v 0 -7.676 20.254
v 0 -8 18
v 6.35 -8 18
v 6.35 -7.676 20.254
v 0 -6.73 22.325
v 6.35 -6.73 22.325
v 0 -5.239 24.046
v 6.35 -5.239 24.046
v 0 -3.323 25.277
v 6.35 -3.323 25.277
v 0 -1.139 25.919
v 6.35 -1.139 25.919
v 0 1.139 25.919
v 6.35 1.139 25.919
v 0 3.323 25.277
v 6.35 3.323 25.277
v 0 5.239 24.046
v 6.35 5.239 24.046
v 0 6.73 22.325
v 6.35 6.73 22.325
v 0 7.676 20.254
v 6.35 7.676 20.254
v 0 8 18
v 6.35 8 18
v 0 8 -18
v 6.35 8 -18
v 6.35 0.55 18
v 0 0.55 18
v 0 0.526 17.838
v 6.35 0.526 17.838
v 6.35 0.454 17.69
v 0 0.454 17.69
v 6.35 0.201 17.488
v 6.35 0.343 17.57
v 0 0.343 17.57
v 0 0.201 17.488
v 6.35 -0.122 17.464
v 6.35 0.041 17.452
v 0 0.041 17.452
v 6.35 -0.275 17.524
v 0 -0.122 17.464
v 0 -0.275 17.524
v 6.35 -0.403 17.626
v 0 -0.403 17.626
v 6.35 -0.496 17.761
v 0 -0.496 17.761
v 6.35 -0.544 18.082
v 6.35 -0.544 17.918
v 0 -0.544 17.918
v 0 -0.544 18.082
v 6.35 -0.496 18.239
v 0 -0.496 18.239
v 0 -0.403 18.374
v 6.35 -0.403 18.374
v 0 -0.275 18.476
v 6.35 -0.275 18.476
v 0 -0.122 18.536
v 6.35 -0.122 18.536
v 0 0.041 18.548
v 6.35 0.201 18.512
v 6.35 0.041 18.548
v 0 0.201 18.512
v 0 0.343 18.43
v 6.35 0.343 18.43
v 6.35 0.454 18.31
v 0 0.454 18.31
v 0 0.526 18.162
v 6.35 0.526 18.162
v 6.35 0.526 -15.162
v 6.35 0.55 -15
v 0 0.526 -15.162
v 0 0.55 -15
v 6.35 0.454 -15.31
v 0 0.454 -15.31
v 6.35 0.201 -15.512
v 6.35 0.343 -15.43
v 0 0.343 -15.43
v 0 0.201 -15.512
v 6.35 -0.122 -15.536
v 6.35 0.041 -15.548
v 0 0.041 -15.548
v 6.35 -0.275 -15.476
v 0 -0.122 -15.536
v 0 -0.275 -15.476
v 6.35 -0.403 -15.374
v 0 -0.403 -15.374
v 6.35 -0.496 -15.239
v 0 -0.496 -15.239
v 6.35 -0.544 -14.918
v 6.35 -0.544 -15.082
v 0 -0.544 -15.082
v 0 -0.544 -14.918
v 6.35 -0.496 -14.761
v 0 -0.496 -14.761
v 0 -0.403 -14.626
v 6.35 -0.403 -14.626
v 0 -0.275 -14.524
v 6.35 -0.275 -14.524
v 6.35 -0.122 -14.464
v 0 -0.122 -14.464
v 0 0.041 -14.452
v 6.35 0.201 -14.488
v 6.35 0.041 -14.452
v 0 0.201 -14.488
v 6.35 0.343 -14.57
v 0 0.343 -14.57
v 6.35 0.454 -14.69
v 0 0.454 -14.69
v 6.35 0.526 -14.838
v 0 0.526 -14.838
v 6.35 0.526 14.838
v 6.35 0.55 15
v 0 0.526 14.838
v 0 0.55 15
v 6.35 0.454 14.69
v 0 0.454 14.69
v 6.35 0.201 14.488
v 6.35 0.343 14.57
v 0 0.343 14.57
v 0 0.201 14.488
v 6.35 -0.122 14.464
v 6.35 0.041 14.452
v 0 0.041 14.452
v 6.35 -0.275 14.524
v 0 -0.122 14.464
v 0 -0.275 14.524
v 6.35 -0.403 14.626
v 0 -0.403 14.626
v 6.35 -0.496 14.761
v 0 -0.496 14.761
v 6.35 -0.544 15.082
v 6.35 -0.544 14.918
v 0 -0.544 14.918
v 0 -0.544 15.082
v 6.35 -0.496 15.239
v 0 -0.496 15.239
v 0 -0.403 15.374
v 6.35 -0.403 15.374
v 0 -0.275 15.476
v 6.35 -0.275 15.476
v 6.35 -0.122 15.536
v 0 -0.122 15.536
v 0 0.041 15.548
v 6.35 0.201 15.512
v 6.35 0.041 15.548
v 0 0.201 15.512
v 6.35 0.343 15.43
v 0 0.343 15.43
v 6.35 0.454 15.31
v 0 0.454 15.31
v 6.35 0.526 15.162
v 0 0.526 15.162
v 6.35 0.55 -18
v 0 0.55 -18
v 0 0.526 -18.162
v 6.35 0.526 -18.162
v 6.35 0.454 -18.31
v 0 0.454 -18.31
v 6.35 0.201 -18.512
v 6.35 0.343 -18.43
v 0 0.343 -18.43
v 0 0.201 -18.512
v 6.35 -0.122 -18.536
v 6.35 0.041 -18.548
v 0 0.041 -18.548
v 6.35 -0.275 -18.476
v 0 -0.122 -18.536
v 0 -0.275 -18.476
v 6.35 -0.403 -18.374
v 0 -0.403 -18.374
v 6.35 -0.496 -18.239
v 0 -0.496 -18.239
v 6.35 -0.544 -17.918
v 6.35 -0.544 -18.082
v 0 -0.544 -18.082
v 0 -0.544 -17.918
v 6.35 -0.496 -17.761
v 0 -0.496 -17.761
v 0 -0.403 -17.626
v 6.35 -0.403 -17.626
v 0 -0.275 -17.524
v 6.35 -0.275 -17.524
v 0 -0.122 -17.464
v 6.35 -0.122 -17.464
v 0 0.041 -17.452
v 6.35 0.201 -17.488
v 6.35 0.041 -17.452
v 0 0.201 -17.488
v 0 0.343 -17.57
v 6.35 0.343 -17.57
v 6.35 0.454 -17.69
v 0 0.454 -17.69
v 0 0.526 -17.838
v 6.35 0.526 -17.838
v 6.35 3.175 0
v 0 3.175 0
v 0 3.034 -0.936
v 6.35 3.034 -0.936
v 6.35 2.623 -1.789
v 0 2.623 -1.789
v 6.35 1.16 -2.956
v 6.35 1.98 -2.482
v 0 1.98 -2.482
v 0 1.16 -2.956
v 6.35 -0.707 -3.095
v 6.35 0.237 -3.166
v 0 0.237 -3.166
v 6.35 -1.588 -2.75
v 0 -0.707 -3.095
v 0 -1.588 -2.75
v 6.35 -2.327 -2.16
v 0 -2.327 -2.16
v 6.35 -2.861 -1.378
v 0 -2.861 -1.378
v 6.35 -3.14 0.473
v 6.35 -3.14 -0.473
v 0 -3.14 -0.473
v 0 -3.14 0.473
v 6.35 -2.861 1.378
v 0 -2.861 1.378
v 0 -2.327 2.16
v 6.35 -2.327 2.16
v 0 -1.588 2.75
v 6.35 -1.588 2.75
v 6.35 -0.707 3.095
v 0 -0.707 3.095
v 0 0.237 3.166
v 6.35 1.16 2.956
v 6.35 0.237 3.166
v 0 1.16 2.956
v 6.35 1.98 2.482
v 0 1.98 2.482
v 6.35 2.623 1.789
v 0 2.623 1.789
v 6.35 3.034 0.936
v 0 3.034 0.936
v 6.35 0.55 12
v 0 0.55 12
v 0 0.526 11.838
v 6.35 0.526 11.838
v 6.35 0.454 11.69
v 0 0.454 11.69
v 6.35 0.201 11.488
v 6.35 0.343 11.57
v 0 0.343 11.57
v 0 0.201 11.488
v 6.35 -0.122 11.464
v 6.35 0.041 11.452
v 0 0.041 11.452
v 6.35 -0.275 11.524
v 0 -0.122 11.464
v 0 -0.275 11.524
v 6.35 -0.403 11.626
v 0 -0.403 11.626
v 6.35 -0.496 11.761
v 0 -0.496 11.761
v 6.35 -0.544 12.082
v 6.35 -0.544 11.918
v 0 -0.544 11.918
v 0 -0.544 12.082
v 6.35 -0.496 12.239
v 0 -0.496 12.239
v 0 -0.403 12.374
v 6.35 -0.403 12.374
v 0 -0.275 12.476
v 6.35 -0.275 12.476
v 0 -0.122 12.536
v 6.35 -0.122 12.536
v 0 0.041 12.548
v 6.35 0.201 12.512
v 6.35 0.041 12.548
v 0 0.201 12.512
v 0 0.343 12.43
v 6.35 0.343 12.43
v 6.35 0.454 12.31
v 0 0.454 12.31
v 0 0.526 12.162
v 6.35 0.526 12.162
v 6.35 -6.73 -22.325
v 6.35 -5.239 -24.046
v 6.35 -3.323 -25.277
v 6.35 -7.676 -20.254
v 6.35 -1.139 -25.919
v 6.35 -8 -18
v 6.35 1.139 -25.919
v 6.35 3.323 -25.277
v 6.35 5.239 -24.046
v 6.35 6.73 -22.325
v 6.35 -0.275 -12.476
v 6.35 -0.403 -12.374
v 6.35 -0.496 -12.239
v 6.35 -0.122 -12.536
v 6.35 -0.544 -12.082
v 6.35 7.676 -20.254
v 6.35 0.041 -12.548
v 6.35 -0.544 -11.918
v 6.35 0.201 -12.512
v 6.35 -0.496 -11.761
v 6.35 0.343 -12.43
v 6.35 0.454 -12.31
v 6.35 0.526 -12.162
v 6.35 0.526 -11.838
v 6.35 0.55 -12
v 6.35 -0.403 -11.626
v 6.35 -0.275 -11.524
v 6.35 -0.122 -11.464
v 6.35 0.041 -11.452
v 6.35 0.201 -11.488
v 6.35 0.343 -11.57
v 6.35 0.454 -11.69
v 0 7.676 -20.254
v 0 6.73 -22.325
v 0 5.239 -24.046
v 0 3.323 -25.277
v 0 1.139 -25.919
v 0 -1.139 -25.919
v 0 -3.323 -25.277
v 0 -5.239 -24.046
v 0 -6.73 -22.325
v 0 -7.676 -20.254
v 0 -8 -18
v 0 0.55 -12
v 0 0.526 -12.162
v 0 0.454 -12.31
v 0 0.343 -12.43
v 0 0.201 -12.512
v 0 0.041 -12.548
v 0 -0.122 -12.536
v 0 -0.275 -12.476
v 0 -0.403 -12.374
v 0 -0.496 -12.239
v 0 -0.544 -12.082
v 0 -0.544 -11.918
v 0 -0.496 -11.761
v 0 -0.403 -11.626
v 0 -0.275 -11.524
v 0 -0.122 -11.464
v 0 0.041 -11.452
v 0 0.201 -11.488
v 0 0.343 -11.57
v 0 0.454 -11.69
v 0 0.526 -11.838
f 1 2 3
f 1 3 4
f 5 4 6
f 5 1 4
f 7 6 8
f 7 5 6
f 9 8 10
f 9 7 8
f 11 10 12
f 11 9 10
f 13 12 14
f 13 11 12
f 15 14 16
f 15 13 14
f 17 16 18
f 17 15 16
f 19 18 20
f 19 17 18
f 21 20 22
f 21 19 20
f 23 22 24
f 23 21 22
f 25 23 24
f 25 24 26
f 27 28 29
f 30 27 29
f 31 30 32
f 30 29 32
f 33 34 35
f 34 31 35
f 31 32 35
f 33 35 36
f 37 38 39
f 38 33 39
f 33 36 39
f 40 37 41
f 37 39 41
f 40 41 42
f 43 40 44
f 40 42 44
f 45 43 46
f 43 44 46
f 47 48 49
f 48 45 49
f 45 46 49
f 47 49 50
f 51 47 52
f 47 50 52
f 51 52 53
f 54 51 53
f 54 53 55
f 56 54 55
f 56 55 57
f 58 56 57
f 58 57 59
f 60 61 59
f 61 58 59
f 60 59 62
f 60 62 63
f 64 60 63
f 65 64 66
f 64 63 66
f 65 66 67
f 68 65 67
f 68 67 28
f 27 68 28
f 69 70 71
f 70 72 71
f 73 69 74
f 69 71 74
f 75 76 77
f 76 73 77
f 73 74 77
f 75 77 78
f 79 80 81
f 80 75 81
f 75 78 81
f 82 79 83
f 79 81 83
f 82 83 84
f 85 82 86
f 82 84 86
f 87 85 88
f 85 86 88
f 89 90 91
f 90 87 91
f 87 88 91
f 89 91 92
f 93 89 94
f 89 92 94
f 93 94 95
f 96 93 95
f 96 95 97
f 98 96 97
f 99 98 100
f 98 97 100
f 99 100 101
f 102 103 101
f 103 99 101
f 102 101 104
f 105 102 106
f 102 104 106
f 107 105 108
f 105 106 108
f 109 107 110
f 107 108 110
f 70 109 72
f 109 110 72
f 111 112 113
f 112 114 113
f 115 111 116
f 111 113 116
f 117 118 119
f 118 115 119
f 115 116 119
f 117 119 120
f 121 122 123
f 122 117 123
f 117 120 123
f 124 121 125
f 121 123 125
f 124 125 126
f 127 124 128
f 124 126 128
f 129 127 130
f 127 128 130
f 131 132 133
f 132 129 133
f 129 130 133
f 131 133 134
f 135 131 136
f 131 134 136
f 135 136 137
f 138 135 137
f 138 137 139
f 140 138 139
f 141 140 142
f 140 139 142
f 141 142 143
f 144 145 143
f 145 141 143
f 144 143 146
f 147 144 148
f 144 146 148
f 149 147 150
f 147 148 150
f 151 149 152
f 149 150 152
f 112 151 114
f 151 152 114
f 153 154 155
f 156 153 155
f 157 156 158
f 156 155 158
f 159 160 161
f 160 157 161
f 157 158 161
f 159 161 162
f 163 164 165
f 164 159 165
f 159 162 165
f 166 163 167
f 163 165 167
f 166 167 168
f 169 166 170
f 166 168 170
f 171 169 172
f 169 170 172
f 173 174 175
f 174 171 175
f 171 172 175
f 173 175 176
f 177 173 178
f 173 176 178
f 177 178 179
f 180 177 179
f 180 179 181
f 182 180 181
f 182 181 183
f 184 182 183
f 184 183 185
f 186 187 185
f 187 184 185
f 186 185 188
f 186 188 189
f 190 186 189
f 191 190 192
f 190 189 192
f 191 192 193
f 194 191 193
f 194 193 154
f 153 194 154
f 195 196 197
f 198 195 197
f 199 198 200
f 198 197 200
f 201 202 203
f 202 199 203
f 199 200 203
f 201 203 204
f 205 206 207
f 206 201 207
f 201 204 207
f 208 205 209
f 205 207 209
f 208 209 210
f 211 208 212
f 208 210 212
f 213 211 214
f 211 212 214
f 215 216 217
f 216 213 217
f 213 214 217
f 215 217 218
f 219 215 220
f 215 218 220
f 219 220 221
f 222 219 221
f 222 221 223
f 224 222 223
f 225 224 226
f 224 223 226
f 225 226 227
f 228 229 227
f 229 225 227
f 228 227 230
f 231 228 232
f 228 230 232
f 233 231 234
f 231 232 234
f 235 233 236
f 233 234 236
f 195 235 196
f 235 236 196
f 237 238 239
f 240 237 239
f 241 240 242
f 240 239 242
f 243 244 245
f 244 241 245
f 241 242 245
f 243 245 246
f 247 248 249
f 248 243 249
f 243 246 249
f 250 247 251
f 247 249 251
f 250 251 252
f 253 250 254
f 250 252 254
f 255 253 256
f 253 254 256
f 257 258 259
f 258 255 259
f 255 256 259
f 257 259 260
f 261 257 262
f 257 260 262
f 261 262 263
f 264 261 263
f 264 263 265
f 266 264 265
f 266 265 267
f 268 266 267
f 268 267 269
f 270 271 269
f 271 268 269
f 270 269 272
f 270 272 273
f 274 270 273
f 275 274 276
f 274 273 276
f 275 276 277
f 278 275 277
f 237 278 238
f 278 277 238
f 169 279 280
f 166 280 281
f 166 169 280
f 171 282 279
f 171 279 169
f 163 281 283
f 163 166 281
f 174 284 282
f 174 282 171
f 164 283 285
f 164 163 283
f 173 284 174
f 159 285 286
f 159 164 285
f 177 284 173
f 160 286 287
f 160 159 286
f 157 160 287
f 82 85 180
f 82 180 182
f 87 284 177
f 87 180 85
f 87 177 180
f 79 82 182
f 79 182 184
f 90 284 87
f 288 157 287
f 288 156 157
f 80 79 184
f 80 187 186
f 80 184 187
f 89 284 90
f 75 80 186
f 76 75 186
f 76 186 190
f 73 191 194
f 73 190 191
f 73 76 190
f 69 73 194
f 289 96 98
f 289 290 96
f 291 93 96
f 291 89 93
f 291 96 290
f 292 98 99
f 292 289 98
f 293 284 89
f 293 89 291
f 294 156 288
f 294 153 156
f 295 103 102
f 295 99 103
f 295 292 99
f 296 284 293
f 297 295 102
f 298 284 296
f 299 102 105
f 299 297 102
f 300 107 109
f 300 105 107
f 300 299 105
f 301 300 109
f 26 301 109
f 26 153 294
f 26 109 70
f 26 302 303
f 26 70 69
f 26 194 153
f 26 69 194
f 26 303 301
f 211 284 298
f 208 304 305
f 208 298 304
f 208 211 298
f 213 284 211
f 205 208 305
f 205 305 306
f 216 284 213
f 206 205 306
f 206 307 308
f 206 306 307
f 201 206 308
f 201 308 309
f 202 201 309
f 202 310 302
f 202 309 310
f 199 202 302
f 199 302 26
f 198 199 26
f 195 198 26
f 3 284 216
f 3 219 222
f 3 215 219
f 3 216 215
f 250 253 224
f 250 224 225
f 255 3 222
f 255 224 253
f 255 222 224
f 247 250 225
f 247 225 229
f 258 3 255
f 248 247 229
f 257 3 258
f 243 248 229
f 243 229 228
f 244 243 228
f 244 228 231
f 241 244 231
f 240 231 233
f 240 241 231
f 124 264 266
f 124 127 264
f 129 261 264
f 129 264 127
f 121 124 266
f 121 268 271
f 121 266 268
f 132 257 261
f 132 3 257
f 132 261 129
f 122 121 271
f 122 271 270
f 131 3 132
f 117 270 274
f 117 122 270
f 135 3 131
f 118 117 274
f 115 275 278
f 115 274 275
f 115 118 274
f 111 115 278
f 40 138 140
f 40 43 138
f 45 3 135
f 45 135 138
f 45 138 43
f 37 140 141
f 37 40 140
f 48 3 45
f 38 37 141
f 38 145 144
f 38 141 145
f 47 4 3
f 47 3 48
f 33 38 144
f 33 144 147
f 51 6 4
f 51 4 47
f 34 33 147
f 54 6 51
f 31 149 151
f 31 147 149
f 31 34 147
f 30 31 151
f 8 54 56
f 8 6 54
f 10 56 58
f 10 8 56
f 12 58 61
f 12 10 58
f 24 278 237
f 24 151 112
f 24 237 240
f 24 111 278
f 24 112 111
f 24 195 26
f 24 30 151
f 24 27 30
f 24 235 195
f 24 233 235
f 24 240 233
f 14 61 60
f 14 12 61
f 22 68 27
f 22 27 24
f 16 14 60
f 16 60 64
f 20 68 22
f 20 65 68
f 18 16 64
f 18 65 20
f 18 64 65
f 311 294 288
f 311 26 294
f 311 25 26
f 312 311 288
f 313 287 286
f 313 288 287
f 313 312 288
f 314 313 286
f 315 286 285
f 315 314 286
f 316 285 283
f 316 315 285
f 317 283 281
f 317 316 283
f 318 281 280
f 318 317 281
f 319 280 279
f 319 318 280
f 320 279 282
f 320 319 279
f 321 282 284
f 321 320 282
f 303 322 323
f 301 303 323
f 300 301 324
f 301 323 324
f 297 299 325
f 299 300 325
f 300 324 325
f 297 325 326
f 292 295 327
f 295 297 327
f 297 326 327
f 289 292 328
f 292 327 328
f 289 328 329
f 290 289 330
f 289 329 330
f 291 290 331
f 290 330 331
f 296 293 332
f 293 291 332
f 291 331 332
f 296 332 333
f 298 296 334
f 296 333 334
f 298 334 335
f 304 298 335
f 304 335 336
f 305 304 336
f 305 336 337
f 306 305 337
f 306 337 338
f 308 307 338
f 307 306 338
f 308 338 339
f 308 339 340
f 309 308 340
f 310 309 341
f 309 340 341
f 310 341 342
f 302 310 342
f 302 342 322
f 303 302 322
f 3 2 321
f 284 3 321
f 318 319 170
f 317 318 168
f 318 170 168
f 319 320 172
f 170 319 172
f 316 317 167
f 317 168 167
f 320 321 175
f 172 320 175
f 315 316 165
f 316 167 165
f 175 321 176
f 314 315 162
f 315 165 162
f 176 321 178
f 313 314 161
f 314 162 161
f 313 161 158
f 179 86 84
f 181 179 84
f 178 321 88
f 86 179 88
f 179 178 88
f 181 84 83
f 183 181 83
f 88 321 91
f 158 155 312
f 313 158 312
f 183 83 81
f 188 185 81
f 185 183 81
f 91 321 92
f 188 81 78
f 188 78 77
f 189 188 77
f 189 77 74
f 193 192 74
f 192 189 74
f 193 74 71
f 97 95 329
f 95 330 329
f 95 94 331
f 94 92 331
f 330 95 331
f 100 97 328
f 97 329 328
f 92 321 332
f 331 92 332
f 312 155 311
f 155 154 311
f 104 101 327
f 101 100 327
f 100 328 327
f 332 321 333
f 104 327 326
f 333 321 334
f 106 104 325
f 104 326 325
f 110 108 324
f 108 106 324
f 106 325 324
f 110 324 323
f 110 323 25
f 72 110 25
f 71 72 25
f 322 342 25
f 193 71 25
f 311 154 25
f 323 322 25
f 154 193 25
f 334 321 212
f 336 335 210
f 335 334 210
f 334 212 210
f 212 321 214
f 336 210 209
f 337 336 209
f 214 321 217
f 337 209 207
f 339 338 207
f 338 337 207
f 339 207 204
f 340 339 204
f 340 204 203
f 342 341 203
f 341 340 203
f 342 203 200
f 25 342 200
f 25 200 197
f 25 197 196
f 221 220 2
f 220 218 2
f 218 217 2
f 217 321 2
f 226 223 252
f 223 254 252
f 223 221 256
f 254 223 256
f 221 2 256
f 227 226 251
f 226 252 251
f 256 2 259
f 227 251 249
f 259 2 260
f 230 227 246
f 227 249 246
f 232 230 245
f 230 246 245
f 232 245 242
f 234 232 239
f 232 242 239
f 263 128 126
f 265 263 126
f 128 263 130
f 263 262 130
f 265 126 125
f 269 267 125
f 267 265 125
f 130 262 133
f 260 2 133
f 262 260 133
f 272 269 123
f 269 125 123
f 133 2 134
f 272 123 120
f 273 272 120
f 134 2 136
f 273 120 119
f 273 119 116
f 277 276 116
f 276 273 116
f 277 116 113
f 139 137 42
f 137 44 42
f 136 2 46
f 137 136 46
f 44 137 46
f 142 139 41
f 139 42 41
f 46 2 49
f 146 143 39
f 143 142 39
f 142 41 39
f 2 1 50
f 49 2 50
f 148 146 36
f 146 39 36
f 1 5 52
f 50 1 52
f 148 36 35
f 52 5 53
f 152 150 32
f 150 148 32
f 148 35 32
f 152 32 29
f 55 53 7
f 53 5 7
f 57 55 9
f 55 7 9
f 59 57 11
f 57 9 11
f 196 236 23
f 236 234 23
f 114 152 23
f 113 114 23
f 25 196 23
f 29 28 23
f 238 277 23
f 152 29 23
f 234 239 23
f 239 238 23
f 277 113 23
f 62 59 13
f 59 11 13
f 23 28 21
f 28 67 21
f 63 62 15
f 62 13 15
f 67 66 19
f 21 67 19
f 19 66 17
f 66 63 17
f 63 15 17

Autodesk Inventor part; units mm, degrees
ref_plane "YZ Plane" through (0, 0, 0) normal (1, 0, 0) x (0, 1, 0)
ref_plane "XZ Plane" through (0, 0, 0) normal (0, 1, 0) x (-1, 0, 0)
ref_plane "XY Plane" through (0, 0, 0) normal (0, 0, 1) x (1, 0, 0)
sketch "Block1" plane through (0, 0, 0) normal (0, 0, 1) x (1, 0, 0)
  circle A0 centre (-34.5082, -40.3774) radius 0.55
  circle A1 centre (-31.5082, -40.3774) radius 0.55
  circle A2 centre (-28.5082, -40.3774) radius 0.55
  point P0 (-31.5082, -40.3774)
  dimension "d7" = 1.1
  dimension "d8" = 1.1
  dimension "d9" = 1.1
sketch "Sketch1" plane through (0, 0, 0) normal (1, 0, 0) x (0, 1, 0)
  circle A0 centre (0, 0) radius 3.175
  line L0 (8, 0) -> (8, -60)
  line L1 (-8, 0) -> (-8, -60)
  arc A1 (-8, -60) -> (8, -60) centre (0, -60) ccw
  circle A2 centre (0, -60) radius 3.175
  line L2 (0, -105.9654) -> (0, 47.9942) construction
  line L3 (8, 0) -> (-8, 0) construction
  line L4 (8, 0) -> (8, 18)
  line L5 (-8, 0) -> (-8, 18)
  arc A3 (8, 18) -> (-8, 18) centre (0, 18) ccw
  line L6 (-36, 0) -> (58.5, 0) construction
  line L7 (0, -45) -> (-22.5, -83.9711)
  line L8 (0, -45) -> (45, -45) construction
  line L9 (-22.5, -83.9711) -> (-22.5, -45)
  line L10 (-22.5, -45) -> (0, -45)
  line L11 (-22.5, -45) -> (-8, -30)
  circle A4 centre (0, -18) radius 8
  circle A5 centre (0, -12) radius 0.55
  circle A6 centre (0, -15) radius 0.55
  circle A7 centre (0, -18) radius 0.55
  circle A8 centre (0, 12) radius 0.55
  circle A9 centre (0, 15) radius 0.55
  circle A10 centre (0, 18) radius 0.55
  point P0 (0, 0)
  point P1 (-8, -58.8564)
  point P2 (-8, -18)
  point P3 (8, -18)
  dimension "d0" = 6.35
  dimension "d2" = 16
  dimension "d4" = 6.35
  dimension "d11" = 12
  dimension "d12" = 60
  dimension "d13" = 45
  dimension "d14" = 120
  dimension "d15" = 45
extrude "Extrusion2" add sketch "Sketch1" along normal blind 6.35 contours L0 A4 L1 L5 A3 L4 | A4
equation "\"d7\" = d9"
equation "\"d8\" = d9"
properties part number "Spacer Skiba"
